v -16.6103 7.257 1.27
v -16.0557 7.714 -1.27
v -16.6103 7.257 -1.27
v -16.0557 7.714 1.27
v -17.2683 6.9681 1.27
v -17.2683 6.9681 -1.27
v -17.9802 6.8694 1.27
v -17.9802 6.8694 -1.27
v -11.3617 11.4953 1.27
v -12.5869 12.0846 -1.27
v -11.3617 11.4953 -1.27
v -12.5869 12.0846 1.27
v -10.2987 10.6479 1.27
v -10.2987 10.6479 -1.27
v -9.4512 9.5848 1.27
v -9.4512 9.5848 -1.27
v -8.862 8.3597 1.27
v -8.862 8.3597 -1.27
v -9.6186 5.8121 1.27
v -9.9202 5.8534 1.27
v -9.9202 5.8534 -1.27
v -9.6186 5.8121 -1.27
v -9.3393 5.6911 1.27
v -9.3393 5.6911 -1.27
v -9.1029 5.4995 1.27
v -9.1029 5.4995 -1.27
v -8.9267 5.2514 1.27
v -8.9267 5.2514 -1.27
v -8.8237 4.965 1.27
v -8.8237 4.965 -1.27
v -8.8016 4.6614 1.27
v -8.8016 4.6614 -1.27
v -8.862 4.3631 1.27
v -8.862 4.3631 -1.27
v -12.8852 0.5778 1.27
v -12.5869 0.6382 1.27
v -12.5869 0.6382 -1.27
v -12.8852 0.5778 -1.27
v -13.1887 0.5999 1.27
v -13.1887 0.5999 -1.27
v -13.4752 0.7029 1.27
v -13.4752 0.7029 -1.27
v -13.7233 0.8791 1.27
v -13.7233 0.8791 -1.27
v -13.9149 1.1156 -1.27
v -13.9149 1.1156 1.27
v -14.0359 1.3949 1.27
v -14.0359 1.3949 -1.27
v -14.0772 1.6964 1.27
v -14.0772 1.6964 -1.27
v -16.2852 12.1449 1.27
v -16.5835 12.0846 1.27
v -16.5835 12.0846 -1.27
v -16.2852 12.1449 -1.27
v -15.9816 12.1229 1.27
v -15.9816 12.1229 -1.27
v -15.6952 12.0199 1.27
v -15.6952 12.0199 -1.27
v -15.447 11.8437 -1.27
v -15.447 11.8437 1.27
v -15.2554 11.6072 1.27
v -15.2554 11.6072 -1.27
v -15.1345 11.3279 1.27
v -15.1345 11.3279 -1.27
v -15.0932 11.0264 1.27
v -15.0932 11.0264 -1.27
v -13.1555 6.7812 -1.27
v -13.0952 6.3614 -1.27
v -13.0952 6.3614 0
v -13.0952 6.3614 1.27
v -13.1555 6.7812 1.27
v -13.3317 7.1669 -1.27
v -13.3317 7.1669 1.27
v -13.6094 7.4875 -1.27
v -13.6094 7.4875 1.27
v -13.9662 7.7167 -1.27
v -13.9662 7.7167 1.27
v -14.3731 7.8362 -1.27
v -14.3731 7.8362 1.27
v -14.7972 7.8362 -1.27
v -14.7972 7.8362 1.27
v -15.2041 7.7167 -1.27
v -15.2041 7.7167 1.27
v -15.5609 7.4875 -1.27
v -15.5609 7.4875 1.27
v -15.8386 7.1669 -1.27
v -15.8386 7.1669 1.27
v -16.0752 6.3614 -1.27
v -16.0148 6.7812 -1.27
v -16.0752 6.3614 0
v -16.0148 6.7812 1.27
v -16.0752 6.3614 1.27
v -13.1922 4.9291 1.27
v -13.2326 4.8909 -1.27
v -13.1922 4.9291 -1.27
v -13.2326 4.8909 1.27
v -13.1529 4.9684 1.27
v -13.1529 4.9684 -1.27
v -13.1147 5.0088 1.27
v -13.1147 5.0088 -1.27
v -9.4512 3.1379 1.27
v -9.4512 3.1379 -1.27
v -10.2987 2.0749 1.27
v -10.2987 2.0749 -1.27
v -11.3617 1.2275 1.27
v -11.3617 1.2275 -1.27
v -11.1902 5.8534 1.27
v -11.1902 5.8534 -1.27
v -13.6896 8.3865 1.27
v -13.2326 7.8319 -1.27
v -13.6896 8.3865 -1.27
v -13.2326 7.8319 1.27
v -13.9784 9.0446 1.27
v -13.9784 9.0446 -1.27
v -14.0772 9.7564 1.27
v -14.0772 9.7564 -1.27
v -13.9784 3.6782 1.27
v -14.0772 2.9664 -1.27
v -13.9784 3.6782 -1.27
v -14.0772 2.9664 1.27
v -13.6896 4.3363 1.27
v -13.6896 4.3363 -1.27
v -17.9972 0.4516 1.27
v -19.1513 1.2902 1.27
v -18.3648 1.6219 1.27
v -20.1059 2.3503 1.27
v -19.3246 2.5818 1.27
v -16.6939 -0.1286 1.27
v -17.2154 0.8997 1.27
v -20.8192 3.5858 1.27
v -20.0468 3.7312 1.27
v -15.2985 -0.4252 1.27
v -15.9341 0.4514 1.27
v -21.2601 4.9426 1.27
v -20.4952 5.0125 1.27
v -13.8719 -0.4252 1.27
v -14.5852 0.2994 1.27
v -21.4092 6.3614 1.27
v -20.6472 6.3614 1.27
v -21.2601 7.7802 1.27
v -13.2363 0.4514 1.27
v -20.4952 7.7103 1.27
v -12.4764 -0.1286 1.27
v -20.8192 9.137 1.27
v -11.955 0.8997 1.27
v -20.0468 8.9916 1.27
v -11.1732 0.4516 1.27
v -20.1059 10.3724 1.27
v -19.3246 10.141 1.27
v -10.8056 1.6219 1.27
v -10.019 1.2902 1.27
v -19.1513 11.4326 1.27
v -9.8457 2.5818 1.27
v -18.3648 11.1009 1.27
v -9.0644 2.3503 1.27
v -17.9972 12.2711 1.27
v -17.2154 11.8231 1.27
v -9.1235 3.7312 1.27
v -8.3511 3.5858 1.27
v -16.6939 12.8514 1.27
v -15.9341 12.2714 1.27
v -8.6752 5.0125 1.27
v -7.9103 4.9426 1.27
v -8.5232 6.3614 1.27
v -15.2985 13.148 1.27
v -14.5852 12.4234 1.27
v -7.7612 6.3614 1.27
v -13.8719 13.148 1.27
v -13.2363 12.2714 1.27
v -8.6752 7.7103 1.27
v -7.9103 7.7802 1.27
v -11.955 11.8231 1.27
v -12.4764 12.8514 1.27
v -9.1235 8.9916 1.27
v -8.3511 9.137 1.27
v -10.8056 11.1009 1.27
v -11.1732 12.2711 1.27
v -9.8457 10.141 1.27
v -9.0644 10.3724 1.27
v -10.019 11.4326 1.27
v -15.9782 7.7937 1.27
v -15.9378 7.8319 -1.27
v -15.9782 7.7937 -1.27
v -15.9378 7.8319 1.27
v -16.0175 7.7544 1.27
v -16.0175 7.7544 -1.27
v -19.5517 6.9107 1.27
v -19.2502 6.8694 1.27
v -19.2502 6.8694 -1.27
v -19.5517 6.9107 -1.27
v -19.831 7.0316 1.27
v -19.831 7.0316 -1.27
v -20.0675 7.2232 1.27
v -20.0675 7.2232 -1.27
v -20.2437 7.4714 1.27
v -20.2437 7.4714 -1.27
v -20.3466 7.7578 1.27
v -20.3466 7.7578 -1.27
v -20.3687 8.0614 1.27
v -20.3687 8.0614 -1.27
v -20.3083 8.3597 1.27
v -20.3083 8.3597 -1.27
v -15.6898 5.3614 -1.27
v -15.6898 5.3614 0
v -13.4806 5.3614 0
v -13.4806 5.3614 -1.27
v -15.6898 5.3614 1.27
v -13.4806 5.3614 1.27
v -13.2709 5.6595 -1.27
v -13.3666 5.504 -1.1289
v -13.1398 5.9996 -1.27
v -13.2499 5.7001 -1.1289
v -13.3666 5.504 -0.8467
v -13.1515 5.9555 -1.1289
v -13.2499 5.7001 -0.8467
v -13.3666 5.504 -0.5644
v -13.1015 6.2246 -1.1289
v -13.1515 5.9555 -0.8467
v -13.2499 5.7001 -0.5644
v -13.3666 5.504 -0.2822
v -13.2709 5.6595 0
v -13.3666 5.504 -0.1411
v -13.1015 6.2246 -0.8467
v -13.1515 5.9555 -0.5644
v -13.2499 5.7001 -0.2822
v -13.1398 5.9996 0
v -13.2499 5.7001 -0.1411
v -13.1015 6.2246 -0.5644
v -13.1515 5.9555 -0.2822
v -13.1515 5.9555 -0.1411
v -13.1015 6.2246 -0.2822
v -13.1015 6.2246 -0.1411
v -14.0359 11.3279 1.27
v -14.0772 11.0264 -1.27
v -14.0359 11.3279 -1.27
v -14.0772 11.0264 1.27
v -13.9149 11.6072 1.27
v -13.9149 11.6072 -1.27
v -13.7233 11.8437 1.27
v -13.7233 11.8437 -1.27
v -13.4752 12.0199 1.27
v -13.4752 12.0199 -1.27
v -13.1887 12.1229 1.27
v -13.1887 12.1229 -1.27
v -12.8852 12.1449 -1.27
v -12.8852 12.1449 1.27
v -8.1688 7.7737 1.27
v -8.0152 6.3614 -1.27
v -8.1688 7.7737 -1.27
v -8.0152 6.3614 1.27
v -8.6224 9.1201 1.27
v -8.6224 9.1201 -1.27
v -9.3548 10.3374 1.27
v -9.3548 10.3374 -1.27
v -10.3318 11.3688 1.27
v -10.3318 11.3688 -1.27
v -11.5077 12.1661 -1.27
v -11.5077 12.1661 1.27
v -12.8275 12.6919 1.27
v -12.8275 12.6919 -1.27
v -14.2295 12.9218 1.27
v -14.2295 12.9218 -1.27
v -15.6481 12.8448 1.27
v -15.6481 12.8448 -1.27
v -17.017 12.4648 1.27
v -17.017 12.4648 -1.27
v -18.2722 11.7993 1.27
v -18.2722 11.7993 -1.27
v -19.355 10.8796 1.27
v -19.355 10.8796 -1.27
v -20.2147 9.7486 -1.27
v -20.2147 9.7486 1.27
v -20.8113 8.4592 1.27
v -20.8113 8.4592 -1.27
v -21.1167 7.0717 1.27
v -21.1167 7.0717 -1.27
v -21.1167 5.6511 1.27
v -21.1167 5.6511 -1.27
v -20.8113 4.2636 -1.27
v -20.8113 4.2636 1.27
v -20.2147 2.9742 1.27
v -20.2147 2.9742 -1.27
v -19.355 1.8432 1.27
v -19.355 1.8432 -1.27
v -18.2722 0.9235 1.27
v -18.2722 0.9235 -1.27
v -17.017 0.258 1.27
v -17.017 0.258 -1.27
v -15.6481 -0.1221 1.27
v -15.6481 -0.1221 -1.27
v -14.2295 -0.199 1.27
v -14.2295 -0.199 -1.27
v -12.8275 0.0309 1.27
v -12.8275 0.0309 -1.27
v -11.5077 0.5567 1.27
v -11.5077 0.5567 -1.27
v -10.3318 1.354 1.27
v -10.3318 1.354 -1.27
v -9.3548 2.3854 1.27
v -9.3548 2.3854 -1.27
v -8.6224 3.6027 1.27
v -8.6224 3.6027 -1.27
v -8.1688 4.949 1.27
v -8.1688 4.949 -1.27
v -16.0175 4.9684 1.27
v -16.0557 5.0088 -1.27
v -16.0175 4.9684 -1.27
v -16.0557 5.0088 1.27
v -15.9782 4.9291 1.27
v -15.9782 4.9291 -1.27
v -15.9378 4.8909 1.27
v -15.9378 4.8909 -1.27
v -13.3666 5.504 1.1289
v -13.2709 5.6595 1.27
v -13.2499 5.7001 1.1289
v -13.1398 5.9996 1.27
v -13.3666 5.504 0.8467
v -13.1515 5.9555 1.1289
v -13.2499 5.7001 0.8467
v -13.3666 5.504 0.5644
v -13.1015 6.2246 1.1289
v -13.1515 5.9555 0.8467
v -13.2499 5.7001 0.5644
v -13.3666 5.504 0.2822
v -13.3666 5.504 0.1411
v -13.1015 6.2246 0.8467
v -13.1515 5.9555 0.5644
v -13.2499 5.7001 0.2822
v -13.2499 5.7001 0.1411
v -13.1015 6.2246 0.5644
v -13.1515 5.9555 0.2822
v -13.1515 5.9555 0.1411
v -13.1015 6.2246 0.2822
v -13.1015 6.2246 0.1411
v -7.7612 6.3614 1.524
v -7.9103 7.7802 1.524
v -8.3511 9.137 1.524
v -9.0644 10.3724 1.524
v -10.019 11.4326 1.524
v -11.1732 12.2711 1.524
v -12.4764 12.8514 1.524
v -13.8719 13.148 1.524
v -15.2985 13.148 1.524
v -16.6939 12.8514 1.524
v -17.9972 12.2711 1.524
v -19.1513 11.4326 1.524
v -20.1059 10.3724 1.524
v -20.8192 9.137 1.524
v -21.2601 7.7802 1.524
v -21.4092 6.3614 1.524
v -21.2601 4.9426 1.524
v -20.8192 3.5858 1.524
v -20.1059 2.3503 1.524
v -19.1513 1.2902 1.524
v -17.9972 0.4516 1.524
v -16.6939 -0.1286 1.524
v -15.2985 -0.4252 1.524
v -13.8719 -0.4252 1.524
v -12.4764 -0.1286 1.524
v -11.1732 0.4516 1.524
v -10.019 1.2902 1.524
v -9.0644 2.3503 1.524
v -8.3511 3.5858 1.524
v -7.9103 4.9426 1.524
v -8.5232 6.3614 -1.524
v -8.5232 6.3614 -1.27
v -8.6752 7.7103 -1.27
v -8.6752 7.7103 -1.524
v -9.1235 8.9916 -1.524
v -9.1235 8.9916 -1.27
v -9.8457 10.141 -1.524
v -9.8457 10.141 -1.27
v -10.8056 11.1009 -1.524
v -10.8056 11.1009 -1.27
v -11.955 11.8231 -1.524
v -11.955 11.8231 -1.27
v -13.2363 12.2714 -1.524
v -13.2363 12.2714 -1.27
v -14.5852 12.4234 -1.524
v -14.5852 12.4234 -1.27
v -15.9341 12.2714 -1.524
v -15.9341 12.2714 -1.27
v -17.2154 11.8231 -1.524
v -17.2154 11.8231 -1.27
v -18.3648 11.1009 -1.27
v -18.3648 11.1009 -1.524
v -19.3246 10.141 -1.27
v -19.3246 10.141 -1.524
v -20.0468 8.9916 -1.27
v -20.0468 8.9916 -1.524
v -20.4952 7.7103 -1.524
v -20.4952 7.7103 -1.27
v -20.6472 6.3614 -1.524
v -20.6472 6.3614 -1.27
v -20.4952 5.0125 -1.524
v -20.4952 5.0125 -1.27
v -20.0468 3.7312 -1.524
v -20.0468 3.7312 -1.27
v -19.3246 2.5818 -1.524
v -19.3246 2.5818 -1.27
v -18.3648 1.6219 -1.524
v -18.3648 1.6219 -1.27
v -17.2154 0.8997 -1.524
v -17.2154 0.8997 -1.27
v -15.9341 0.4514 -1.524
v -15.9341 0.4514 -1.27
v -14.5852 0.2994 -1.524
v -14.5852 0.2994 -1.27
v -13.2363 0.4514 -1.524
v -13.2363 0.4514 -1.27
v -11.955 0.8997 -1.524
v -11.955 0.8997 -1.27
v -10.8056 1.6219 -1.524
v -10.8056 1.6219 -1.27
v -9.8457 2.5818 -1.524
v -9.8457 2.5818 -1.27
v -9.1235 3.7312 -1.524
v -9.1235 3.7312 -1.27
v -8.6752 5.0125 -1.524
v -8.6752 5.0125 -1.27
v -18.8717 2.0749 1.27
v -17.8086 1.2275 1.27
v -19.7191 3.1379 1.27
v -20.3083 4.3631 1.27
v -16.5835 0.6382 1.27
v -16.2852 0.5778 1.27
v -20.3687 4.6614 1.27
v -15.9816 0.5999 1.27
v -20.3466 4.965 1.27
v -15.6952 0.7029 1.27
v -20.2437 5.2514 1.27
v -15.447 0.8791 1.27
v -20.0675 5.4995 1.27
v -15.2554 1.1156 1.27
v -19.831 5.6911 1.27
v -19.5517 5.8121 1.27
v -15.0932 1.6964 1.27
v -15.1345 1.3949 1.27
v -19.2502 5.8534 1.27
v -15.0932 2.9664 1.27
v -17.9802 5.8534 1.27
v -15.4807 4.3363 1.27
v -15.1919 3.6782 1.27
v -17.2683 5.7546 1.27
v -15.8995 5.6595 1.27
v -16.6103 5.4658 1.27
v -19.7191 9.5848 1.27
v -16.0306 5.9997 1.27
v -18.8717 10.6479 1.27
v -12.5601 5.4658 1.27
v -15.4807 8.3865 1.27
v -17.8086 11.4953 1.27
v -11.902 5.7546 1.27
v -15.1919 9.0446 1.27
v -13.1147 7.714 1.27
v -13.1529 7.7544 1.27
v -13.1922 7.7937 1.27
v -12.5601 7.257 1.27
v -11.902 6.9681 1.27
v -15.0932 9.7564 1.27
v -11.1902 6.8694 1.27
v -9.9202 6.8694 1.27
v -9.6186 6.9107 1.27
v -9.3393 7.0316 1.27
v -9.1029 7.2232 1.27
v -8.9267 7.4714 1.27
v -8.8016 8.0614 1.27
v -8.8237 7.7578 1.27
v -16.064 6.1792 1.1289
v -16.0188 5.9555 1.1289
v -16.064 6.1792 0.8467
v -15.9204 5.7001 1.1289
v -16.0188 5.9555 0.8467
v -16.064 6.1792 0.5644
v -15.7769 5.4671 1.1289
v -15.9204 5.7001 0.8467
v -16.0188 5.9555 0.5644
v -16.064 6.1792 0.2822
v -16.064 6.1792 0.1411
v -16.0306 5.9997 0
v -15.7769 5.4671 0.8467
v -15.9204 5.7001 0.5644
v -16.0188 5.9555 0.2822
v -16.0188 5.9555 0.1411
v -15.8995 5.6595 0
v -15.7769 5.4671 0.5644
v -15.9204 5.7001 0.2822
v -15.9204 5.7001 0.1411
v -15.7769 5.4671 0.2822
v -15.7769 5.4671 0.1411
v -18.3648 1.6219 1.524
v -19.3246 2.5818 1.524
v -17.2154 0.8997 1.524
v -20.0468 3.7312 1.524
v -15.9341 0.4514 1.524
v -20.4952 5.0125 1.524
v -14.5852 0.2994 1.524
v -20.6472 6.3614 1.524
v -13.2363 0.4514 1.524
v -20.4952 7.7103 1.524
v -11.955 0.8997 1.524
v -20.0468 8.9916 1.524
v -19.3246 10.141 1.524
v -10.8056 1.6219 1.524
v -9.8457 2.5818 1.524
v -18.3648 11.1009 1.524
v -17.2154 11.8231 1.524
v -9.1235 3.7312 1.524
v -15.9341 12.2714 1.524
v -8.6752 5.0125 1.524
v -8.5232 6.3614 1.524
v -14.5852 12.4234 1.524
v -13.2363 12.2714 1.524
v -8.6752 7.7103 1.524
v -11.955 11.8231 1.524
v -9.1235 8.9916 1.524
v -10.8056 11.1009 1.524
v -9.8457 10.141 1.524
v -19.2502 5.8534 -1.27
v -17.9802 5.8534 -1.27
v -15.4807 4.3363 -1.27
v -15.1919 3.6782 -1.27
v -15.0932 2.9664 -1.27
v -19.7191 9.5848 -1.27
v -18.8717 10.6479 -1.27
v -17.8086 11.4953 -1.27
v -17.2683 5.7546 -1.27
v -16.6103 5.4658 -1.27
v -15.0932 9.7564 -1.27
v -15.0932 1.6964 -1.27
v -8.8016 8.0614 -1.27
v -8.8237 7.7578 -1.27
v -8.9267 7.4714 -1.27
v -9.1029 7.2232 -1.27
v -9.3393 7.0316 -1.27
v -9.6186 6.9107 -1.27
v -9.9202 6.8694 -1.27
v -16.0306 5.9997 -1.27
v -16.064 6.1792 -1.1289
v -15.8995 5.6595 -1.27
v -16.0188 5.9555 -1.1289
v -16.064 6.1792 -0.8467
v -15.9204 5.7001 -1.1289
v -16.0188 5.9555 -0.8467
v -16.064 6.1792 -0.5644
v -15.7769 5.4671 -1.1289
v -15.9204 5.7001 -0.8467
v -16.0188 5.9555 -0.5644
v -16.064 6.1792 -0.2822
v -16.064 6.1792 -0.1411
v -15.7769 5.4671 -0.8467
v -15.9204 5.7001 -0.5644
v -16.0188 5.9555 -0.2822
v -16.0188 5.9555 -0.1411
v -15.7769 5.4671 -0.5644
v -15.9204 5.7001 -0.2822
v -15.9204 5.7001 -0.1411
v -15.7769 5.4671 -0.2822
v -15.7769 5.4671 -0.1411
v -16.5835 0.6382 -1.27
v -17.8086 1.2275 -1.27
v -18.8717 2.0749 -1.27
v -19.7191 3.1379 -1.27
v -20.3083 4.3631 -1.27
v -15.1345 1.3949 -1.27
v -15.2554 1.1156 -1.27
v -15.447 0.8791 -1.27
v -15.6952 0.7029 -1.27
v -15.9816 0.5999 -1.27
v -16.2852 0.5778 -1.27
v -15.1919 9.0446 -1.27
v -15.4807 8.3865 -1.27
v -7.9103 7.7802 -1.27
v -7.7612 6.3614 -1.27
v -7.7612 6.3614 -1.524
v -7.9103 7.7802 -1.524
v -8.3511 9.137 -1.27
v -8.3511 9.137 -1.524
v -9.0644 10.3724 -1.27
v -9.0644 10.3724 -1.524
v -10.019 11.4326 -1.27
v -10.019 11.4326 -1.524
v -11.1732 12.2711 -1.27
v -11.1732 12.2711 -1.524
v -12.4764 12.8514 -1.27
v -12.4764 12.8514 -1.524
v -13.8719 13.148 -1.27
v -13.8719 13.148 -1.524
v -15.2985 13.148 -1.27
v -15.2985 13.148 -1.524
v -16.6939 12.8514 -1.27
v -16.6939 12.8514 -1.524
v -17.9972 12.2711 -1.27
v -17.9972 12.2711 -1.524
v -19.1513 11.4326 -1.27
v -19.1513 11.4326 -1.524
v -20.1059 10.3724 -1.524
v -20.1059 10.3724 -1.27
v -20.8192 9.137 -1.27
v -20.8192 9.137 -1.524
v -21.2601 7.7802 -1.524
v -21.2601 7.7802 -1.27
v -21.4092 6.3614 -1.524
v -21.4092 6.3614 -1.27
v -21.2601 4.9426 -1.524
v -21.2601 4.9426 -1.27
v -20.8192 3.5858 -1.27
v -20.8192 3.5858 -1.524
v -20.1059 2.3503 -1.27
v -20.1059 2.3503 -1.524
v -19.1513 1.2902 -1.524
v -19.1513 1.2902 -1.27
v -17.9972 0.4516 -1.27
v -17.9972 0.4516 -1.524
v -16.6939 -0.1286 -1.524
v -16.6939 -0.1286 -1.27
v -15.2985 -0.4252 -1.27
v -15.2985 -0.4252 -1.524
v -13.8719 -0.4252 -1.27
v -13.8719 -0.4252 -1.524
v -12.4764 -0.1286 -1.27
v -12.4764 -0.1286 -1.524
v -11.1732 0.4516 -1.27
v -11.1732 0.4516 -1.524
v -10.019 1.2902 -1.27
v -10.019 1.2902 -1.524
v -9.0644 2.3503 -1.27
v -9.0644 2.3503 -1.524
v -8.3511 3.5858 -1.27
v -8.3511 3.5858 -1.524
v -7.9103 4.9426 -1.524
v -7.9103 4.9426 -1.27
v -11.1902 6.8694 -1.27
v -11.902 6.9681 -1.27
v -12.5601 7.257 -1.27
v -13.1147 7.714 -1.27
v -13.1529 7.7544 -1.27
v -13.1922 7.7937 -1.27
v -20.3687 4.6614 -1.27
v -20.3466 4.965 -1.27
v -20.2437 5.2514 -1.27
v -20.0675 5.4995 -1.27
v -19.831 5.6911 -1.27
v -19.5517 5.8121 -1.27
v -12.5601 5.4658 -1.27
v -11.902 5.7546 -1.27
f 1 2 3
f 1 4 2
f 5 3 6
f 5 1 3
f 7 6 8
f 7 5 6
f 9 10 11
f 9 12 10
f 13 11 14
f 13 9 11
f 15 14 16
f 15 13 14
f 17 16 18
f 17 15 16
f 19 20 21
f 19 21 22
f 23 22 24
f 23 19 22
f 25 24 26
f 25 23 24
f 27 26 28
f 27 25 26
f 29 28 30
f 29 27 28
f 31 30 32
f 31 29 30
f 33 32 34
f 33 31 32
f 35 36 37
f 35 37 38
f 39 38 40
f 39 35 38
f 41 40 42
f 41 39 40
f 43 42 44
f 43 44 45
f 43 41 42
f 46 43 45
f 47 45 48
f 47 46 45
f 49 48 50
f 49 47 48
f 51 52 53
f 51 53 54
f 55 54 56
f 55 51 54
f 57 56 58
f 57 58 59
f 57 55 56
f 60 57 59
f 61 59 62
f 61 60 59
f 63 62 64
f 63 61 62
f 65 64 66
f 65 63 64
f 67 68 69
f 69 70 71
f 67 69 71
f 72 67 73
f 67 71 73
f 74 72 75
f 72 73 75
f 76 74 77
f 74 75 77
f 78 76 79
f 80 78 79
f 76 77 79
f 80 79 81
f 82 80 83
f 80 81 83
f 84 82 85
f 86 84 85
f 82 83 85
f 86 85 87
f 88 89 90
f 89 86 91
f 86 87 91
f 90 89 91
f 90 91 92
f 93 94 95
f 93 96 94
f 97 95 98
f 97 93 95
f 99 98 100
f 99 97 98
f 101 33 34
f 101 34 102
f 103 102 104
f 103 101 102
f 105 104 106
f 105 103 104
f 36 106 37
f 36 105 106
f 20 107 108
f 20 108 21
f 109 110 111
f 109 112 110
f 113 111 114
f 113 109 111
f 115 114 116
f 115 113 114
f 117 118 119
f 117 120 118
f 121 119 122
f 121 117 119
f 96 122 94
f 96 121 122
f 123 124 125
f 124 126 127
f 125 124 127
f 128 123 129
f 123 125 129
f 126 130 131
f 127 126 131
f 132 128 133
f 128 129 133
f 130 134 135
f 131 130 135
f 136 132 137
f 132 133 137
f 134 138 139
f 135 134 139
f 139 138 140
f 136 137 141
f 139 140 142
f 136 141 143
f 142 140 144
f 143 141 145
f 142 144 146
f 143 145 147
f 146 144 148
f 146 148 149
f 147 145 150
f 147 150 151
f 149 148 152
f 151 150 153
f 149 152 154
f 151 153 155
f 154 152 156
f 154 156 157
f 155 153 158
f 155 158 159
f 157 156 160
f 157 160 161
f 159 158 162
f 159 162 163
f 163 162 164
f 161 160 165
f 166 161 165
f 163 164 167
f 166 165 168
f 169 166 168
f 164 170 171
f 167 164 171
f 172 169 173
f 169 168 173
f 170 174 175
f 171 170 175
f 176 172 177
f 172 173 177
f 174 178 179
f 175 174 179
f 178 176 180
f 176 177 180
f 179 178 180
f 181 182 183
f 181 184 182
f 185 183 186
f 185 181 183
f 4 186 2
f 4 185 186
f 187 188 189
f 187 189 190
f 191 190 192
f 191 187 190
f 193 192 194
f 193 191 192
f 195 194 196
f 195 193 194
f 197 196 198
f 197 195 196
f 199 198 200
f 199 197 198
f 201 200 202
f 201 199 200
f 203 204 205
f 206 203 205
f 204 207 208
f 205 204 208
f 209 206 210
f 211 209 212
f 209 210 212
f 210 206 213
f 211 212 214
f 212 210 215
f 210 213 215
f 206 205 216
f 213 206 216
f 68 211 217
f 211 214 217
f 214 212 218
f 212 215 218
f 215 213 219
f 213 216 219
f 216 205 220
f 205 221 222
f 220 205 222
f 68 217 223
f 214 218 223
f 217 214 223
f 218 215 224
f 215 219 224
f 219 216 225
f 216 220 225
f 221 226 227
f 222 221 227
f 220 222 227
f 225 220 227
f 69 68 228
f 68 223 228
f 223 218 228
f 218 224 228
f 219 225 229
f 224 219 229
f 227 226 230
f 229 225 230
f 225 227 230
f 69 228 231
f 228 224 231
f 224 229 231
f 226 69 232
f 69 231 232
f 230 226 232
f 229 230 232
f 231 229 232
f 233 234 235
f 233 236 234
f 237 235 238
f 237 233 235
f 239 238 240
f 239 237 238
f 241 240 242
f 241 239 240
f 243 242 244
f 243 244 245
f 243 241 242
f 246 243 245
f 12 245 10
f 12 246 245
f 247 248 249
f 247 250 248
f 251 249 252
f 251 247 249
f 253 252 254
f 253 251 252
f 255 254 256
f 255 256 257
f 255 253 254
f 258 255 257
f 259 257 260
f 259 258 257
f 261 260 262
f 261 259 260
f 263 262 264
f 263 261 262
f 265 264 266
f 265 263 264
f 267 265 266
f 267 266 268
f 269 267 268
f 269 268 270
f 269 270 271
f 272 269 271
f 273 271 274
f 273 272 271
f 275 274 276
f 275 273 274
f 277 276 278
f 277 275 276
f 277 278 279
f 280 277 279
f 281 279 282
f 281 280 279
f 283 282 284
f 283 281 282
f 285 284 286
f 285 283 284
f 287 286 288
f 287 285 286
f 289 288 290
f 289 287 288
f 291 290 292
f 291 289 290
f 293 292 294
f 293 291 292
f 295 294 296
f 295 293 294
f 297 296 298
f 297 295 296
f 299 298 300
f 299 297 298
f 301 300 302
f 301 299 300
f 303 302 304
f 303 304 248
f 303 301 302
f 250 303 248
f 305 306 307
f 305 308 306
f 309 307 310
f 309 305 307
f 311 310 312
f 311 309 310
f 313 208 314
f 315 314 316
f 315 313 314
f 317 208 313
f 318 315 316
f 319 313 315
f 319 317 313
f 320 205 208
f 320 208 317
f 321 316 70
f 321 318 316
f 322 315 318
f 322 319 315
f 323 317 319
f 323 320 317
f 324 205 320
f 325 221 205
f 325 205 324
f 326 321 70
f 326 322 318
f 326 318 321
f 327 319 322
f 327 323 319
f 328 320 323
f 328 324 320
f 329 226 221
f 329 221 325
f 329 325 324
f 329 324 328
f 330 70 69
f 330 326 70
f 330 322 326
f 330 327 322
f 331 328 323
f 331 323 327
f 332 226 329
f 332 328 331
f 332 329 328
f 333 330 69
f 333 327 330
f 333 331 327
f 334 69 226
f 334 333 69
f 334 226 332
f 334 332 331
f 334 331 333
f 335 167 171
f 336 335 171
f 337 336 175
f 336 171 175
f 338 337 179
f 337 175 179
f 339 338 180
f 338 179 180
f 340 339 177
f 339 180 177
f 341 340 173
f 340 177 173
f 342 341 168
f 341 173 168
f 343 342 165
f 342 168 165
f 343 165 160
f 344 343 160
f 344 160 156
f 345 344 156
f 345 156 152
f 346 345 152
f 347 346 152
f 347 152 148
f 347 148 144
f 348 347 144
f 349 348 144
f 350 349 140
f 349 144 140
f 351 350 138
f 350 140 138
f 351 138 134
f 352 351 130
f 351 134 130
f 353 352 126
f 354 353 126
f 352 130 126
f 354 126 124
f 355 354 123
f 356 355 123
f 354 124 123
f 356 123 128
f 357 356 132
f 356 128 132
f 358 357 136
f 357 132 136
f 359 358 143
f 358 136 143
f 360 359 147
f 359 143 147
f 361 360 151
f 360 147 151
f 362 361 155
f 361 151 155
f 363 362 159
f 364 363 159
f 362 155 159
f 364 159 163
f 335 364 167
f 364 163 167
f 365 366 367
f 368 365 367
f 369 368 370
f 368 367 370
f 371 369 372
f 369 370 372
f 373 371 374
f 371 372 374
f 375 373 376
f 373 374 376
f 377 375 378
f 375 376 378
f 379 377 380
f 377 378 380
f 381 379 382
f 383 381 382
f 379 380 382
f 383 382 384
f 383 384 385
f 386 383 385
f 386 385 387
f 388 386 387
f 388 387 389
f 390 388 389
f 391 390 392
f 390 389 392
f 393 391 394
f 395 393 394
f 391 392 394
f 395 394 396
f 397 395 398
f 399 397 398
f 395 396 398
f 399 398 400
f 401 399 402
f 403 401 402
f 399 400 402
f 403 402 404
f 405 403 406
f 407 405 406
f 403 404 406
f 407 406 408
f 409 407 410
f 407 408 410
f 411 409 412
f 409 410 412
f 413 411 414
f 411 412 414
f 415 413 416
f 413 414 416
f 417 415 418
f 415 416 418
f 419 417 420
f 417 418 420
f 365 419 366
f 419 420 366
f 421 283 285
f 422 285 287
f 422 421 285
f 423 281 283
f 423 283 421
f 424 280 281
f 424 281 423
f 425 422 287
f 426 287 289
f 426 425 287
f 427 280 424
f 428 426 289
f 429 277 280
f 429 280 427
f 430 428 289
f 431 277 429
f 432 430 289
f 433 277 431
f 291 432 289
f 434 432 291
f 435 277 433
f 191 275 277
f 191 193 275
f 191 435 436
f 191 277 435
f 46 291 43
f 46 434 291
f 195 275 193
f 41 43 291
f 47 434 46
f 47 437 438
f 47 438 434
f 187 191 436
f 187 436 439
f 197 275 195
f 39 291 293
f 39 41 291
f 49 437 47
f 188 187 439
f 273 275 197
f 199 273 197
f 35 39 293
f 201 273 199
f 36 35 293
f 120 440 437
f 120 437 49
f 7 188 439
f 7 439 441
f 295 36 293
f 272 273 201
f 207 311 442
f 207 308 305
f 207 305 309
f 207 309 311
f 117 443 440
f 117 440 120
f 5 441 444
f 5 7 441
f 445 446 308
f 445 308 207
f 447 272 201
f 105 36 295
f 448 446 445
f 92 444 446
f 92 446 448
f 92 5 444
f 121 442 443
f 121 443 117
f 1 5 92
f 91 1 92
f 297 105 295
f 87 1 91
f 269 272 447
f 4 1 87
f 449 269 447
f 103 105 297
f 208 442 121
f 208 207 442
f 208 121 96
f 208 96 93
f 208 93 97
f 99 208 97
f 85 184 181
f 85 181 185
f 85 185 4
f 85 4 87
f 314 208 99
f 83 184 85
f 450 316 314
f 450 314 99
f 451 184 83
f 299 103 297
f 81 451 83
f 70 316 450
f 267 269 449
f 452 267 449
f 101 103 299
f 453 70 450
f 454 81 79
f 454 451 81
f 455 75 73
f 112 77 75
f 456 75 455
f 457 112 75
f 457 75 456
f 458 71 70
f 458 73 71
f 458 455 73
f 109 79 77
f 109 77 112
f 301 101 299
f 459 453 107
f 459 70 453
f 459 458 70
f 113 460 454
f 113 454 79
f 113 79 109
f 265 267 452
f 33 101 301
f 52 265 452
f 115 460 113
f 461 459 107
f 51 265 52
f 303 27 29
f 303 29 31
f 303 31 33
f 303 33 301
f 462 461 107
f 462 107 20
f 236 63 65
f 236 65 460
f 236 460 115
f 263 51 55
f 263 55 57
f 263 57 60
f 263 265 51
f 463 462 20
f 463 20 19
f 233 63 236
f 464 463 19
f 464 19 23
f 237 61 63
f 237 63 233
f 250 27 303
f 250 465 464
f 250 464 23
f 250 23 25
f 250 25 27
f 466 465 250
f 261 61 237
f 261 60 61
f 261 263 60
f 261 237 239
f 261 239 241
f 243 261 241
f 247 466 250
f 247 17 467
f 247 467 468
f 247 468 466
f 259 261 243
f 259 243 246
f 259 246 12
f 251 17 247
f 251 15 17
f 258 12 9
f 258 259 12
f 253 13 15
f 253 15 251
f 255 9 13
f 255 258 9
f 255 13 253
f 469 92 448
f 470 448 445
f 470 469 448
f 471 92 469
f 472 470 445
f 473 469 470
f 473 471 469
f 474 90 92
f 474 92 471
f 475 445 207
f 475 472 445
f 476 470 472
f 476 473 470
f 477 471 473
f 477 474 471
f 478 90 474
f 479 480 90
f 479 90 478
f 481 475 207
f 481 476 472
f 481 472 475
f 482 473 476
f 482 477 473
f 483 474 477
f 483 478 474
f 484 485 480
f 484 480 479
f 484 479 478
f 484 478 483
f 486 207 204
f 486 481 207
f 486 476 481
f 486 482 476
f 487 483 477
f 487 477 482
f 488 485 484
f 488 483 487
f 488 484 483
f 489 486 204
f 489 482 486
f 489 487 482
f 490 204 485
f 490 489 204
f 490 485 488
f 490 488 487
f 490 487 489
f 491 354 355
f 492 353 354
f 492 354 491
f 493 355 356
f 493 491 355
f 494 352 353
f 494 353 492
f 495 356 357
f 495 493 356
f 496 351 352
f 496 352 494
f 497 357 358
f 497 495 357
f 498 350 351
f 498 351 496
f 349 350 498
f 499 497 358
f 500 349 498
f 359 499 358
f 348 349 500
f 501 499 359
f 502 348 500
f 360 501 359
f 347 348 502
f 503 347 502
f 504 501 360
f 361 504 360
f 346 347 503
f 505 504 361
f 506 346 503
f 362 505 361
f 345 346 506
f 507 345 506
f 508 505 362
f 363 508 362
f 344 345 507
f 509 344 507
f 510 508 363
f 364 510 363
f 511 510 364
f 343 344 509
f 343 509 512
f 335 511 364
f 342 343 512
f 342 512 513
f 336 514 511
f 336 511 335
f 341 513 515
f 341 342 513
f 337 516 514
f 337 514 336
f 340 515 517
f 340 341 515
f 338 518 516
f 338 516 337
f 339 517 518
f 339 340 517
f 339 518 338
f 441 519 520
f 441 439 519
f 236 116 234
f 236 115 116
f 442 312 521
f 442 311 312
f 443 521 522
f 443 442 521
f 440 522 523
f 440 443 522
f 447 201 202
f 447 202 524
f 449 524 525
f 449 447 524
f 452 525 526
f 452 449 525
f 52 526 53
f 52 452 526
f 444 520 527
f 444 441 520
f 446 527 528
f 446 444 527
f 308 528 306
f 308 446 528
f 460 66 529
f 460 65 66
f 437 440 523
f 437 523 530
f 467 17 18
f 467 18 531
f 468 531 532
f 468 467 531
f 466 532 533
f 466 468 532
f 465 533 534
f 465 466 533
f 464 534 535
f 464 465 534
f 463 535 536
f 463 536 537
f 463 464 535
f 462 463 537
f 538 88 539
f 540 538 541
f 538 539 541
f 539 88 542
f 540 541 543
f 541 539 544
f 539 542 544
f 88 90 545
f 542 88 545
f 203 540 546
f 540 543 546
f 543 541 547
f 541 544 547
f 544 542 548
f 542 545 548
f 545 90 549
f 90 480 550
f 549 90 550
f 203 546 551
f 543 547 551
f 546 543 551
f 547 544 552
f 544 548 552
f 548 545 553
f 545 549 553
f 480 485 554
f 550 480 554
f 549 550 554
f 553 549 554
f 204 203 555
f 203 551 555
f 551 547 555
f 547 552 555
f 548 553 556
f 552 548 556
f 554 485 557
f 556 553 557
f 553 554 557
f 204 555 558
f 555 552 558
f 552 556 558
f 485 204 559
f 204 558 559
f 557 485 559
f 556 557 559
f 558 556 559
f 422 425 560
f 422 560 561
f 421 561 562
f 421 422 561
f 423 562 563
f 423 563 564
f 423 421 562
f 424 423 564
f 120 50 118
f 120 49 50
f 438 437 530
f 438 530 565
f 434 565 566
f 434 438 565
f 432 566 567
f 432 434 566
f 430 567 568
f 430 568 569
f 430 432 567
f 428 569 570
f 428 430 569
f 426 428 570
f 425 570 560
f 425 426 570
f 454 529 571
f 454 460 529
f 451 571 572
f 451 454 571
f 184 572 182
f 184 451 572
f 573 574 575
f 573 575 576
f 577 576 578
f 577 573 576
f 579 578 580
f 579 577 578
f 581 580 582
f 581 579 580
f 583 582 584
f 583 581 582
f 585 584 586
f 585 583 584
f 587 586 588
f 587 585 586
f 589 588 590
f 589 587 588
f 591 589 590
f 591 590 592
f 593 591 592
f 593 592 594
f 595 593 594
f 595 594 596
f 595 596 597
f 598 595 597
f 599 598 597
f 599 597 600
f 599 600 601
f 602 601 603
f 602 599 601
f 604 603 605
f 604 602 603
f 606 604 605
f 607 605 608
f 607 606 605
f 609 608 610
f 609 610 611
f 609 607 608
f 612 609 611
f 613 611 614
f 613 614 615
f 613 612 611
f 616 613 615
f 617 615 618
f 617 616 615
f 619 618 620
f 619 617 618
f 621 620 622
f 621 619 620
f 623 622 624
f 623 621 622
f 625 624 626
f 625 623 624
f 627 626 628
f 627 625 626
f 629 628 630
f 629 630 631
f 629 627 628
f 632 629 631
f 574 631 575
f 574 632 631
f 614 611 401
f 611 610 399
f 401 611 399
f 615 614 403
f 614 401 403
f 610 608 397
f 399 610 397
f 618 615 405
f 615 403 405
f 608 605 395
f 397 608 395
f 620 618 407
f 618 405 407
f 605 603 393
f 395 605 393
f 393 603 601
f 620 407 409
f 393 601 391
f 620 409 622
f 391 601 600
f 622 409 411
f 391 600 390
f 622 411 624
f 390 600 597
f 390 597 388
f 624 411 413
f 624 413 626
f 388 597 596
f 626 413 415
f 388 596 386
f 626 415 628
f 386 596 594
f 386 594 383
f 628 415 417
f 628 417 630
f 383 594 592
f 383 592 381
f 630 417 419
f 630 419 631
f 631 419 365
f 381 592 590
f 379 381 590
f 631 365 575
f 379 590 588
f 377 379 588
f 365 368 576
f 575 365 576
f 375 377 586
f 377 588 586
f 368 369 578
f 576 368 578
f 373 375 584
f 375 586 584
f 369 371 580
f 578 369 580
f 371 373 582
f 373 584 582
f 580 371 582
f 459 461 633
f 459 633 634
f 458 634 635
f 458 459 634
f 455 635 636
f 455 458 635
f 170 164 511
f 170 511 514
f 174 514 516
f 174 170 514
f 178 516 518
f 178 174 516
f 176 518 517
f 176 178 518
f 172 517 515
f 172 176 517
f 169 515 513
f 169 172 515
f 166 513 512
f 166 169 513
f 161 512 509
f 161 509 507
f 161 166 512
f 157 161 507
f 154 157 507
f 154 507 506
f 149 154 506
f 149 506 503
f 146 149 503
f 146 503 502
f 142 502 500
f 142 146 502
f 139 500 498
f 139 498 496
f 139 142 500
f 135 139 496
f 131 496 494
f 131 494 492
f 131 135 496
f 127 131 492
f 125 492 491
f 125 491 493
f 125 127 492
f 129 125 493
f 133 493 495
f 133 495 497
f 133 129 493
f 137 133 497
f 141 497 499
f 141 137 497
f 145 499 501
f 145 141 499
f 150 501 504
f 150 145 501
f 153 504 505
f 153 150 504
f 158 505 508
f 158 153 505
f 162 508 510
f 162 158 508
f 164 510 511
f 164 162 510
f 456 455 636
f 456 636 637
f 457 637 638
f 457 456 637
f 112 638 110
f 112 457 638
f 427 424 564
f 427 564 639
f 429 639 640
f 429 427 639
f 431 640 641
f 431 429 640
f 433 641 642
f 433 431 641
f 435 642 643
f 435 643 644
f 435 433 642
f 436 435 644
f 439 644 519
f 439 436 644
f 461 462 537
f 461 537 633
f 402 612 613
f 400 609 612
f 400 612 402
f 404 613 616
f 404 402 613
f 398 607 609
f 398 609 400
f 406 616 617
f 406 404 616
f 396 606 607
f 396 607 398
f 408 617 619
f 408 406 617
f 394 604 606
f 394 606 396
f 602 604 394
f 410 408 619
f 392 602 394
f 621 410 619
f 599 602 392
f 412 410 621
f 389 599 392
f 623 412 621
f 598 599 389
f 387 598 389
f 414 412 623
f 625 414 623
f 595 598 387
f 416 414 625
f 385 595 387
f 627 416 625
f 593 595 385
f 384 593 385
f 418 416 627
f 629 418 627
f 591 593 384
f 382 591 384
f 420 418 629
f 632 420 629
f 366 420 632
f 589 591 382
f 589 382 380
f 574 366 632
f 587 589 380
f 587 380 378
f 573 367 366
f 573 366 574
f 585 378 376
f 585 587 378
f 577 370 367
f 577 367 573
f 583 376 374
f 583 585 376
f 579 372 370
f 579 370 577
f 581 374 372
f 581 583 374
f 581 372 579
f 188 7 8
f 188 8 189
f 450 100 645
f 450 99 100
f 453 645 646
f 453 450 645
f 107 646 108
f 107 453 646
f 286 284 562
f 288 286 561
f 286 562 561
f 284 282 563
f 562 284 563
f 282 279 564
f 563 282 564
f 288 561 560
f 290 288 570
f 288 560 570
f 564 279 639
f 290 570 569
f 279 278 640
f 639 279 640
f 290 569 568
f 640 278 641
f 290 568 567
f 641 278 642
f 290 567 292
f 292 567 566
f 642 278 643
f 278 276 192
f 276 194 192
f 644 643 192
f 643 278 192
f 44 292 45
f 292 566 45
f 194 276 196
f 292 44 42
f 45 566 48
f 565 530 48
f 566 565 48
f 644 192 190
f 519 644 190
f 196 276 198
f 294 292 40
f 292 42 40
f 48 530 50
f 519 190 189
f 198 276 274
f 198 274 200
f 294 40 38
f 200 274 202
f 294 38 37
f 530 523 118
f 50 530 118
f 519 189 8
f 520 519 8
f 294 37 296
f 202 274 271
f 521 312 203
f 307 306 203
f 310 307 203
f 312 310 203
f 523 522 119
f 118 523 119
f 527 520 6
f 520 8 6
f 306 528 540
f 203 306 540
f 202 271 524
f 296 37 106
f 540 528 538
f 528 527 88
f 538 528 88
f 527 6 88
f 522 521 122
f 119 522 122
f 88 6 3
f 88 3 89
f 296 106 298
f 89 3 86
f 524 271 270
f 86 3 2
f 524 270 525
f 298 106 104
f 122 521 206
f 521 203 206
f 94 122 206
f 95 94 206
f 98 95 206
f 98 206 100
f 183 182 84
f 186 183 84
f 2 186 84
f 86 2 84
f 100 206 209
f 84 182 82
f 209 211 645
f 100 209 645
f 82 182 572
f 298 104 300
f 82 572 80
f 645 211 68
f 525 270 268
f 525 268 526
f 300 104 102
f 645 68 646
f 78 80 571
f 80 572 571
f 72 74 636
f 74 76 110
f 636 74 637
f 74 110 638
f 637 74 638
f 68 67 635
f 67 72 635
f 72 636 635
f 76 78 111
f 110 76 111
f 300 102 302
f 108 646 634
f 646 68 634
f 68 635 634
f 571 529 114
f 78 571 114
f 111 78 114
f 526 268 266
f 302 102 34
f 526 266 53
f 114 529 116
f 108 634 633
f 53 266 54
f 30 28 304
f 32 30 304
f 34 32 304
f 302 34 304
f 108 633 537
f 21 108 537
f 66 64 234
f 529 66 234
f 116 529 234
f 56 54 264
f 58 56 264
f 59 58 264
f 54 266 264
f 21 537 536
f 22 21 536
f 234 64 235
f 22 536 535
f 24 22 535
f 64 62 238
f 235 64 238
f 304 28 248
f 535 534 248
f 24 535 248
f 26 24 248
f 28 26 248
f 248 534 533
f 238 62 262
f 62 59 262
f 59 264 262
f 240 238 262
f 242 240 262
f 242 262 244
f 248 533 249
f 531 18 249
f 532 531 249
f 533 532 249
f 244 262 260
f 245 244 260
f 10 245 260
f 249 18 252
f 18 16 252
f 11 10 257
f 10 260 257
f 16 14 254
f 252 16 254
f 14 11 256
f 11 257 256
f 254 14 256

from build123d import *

# Parameters (mm, degrees)
SKETCH1_R           = 6.569999999
SKETCH1_R_2         = 6.061999999
SKETCH1_R_3         = 1.997999999
BOSS_EXTRUDE1_DEPTH = 1.27
BOSS_EXTRUDE2_START = 1.27
SKETCH1_5_R         = 6.823999999
SKETCH1_5_R_2       = 6.061999999
BOSS_EXTRUDE2_DEPTH = 0.254


with BuildPart() as part:
    # Sketch1 → Boss-Extrude1 (new, symmetric)
    with BuildSketch(Plane.XY):
        with Locations((-14.585173992, 6.361392546)):
            Circle(SKETCH1_R)
        with Locations((-14.585173992, 6.361392546)):
            Circle(SKETCH1_R_2, mode=Mode.SUBTRACT)
        with BuildLine():
            Line((-14.077173992, 9.756392545), (-14.077173992, 11.026392545))
            ThreePointArc((-14.077173992, 11.026392545), (-13.605249635, 11.940269174), (-12.586887207, 12.084564212))
            ThreePointArc((-12.586887207, 12.084564212), (-14.585173992, 12.423392545), (-16.583460777, 12.084564212))
            ThreePointArc((-16.583460777, 12.084564212), (-15.565098349, 11.940269174), (-15.093173992, 11.026392545))
            Line((-15.093173992, 11.026392545), (-15.093173992, 9.756392545))
            ThreePointArc((-15.093173992, 9.756392545), (-15.313620832, 8.705559935), (-15.937790686, 7.831913568))
            ThreePointArc((-15.937790686, 7.831913568), (-14.585173992, 8.359392545), (-13.232557298, 7.831913568))
            ThreePointArc((-13.232557298, 7.831913568), (-13.856727152, 8.705559935), (-14.077173992, 9.756392545))
        make_face()
        with BuildLine():
            ThreePointArc((-8.523173993, 6.361392546), (-8.608481319, 7.374797044), (-8.862002326, 8.35967933))
            ThreePointArc((-8.862002326, 8.35967933), (-9.006297363, 7.341316902), (-9.920173993, 6.869392546))
            Line((-9.920173993, 6.869392546), (-11.190173993, 6.869392546))
            ThreePointArc((-11.190173993, 6.869392546), (-12.241006602, 7.089839385), (-13.11465297, 7.714009239))
            ThreePointArc((-13.11465297, 7.714009239), (-12.723708843, 7.087306795), (-12.587173993, 6.361392546))
            ThreePointArc((-12.587173993, 6.361392546), (-12.723708843, 5.635478296), (-13.11465297, 5.008775852))
            ThreePointArc((-13.11465297, 5.008775852), (-12.241006602, 5.632945706), (-11.190173993, 5.853392546))
            Line((-11.190173993, 5.853392546), (-9.920173993, 5.853392546))
            ThreePointArc((-9.920173993, 5.853392546), (-9.006297363, 5.381468189), (-8.862002326, 4.363105761))
            ThreePointArc((-8.862002326, 4.363105761), (-8.608481319, 5.347988047), (-8.523173993, 6.361392546))
        make_face()
        with BuildLine():
            ThreePointArc((-19.250173991, 6.869392546), (-20.164050621, 7.341316902), (-20.308345658, 8.35967933))
            ThreePointArc((-20.308345658, 8.35967933), (-20.647173991, 6.361392546), (-20.308345658, 4.363105761))
            ThreePointArc((-20.308345658, 4.363105761), (-20.164050621, 5.381468189), (-19.250173991, 5.853392546))
            Line((-19.250173991, 5.853392546), (-17.980173991, 5.853392546))
            ThreePointArc((-17.980173991, 5.853392546), (-16.929341382, 5.632945706), (-16.055695014, 5.008775852))
            ThreePointArc((-16.055695014, 5.008775852), (-16.583173991, 6.361392546), (-16.055695014, 7.714009239))
            ThreePointArc((-16.055695014, 7.714009239), (-16.929341382, 7.089839385), (-17.980173991, 6.869392546))
            Line((-17.980173991, 6.869392546), (-19.250173991, 6.869392546))
        make_face()
        with BuildLine():
            ThreePointArc((-16.583460777, 0.63822088), (-14.585173992, 0.299392546), (-12.586887207, 0.63822088))
            ThreePointArc((-12.586887207, 0.63822088), (-13.605249635, 0.782515917), (-14.077173992, 1.696392546))
            Line((-14.077173992, 1.696392546), (-14.077173992, 2.966392546))
            ThreePointArc((-14.077173992, 2.966392546), (-13.856727152, 4.017225156), (-13.232557298, 4.890871523))
            ThreePointArc((-13.232557298, 4.890871523), (-14.585173992, 4.363392546), (-15.937790686, 4.890871523))
            ThreePointArc((-15.937790686, 4.890871523), (-15.313620832, 4.017225156), (-15.093173992, 2.966392546))
            Line((-15.093173992, 2.966392546), (-15.093173992, 1.696392546))
            ThreePointArc((-15.093173992, 1.696392546), (-15.565098349, 0.782515917), (-16.583460777, 0.63822088))
        make_face()
        with Locations((-14.585173992, 6.361392546)):
            Circle(SKETCH1_R_3)
        with BuildLine():
            add(Edge.make_bspline(
                [(-13.480592623, 5.361392545), (-13.460539436, 5.384341171), (-13.420470859, 5.430195167), (-13.365842841, 5.503511201), (-13.307154336, 5.59247995), (-13.248045319, 5.69918428), (-13.192924177, 5.824787769), (-13.14943929, 5.954910636), (-13.118404819, 6.088487495), (-13.098791679, 6.224357356), (-13.096379888, 6.315714149), (-13.095173993, 6.361392546)],
                knots=[0, 0, 0, 0, 0.083397986, 0.166638776, 0.250036761, 0.375030634, 0.500024507, 0.62501838, 0.750012254, 0.875006127, 1, 1, 1, 1], degree=3))
            ThreePointArc((-13.095173993, 6.361392546), (-14.585173992, 7.851392545), (-16.075173991, 6.361392546))
            add(Edge.make_bspline(
                [(-16.075173991, 6.361392546), (-16.074638254, 6.330921531), (-16.073567789, 6.270036937), (-16.064859774, 6.179022479), (-16.04865674, 6.073679037), (-16.020862372, 5.954905457), (-15.977427672, 5.824797796), (-15.922333529, 5.699149352), (-15.85569141, 5.579296345), (-15.779043389, 5.46540879), (-15.719518037, 5.396064627), (-15.689755361, 5.361392545)],
                knots=[0, 0, 0, 0, 0.083397986, 0.166638774, 0.25003676, 0.375030634, 0.500024507, 0.62501838, 0.750012253, 0.875006126, 1, 1, 1, 1], degree=3))
            Line((-15.689755361, 5.361392545), (-13.480592623, 5.361392545))
        make_face(mode=Mode.SUBTRACT)
    extrude(amount=BOSS_EXTRUDE1_DEPTH, both=True)


with BuildPart() as body_2:
    # Sketch1<5> → Boss-Extrude2 (new body)
    with BuildSketch(Plane.XY.offset(BOSS_EXTRUDE2_START)):
        with Locations((-14.585173992, 6.361392546)):
            Circle(SKETCH1_5_R)
        with Locations((-14.585173992, 6.361392546)):
            Circle(SKETCH1_5_R_2, mode=Mode.SUBTRACT)
    extrude(amount=BOSS_EXTRUDE2_DEPTH)


with BuildPart() as body_3:
    # Mirror2: mirrored copy
    add(body_2.part.mirror(Plane.XY))


solid = Compound([part.part, body_2.part, body_3.part])
